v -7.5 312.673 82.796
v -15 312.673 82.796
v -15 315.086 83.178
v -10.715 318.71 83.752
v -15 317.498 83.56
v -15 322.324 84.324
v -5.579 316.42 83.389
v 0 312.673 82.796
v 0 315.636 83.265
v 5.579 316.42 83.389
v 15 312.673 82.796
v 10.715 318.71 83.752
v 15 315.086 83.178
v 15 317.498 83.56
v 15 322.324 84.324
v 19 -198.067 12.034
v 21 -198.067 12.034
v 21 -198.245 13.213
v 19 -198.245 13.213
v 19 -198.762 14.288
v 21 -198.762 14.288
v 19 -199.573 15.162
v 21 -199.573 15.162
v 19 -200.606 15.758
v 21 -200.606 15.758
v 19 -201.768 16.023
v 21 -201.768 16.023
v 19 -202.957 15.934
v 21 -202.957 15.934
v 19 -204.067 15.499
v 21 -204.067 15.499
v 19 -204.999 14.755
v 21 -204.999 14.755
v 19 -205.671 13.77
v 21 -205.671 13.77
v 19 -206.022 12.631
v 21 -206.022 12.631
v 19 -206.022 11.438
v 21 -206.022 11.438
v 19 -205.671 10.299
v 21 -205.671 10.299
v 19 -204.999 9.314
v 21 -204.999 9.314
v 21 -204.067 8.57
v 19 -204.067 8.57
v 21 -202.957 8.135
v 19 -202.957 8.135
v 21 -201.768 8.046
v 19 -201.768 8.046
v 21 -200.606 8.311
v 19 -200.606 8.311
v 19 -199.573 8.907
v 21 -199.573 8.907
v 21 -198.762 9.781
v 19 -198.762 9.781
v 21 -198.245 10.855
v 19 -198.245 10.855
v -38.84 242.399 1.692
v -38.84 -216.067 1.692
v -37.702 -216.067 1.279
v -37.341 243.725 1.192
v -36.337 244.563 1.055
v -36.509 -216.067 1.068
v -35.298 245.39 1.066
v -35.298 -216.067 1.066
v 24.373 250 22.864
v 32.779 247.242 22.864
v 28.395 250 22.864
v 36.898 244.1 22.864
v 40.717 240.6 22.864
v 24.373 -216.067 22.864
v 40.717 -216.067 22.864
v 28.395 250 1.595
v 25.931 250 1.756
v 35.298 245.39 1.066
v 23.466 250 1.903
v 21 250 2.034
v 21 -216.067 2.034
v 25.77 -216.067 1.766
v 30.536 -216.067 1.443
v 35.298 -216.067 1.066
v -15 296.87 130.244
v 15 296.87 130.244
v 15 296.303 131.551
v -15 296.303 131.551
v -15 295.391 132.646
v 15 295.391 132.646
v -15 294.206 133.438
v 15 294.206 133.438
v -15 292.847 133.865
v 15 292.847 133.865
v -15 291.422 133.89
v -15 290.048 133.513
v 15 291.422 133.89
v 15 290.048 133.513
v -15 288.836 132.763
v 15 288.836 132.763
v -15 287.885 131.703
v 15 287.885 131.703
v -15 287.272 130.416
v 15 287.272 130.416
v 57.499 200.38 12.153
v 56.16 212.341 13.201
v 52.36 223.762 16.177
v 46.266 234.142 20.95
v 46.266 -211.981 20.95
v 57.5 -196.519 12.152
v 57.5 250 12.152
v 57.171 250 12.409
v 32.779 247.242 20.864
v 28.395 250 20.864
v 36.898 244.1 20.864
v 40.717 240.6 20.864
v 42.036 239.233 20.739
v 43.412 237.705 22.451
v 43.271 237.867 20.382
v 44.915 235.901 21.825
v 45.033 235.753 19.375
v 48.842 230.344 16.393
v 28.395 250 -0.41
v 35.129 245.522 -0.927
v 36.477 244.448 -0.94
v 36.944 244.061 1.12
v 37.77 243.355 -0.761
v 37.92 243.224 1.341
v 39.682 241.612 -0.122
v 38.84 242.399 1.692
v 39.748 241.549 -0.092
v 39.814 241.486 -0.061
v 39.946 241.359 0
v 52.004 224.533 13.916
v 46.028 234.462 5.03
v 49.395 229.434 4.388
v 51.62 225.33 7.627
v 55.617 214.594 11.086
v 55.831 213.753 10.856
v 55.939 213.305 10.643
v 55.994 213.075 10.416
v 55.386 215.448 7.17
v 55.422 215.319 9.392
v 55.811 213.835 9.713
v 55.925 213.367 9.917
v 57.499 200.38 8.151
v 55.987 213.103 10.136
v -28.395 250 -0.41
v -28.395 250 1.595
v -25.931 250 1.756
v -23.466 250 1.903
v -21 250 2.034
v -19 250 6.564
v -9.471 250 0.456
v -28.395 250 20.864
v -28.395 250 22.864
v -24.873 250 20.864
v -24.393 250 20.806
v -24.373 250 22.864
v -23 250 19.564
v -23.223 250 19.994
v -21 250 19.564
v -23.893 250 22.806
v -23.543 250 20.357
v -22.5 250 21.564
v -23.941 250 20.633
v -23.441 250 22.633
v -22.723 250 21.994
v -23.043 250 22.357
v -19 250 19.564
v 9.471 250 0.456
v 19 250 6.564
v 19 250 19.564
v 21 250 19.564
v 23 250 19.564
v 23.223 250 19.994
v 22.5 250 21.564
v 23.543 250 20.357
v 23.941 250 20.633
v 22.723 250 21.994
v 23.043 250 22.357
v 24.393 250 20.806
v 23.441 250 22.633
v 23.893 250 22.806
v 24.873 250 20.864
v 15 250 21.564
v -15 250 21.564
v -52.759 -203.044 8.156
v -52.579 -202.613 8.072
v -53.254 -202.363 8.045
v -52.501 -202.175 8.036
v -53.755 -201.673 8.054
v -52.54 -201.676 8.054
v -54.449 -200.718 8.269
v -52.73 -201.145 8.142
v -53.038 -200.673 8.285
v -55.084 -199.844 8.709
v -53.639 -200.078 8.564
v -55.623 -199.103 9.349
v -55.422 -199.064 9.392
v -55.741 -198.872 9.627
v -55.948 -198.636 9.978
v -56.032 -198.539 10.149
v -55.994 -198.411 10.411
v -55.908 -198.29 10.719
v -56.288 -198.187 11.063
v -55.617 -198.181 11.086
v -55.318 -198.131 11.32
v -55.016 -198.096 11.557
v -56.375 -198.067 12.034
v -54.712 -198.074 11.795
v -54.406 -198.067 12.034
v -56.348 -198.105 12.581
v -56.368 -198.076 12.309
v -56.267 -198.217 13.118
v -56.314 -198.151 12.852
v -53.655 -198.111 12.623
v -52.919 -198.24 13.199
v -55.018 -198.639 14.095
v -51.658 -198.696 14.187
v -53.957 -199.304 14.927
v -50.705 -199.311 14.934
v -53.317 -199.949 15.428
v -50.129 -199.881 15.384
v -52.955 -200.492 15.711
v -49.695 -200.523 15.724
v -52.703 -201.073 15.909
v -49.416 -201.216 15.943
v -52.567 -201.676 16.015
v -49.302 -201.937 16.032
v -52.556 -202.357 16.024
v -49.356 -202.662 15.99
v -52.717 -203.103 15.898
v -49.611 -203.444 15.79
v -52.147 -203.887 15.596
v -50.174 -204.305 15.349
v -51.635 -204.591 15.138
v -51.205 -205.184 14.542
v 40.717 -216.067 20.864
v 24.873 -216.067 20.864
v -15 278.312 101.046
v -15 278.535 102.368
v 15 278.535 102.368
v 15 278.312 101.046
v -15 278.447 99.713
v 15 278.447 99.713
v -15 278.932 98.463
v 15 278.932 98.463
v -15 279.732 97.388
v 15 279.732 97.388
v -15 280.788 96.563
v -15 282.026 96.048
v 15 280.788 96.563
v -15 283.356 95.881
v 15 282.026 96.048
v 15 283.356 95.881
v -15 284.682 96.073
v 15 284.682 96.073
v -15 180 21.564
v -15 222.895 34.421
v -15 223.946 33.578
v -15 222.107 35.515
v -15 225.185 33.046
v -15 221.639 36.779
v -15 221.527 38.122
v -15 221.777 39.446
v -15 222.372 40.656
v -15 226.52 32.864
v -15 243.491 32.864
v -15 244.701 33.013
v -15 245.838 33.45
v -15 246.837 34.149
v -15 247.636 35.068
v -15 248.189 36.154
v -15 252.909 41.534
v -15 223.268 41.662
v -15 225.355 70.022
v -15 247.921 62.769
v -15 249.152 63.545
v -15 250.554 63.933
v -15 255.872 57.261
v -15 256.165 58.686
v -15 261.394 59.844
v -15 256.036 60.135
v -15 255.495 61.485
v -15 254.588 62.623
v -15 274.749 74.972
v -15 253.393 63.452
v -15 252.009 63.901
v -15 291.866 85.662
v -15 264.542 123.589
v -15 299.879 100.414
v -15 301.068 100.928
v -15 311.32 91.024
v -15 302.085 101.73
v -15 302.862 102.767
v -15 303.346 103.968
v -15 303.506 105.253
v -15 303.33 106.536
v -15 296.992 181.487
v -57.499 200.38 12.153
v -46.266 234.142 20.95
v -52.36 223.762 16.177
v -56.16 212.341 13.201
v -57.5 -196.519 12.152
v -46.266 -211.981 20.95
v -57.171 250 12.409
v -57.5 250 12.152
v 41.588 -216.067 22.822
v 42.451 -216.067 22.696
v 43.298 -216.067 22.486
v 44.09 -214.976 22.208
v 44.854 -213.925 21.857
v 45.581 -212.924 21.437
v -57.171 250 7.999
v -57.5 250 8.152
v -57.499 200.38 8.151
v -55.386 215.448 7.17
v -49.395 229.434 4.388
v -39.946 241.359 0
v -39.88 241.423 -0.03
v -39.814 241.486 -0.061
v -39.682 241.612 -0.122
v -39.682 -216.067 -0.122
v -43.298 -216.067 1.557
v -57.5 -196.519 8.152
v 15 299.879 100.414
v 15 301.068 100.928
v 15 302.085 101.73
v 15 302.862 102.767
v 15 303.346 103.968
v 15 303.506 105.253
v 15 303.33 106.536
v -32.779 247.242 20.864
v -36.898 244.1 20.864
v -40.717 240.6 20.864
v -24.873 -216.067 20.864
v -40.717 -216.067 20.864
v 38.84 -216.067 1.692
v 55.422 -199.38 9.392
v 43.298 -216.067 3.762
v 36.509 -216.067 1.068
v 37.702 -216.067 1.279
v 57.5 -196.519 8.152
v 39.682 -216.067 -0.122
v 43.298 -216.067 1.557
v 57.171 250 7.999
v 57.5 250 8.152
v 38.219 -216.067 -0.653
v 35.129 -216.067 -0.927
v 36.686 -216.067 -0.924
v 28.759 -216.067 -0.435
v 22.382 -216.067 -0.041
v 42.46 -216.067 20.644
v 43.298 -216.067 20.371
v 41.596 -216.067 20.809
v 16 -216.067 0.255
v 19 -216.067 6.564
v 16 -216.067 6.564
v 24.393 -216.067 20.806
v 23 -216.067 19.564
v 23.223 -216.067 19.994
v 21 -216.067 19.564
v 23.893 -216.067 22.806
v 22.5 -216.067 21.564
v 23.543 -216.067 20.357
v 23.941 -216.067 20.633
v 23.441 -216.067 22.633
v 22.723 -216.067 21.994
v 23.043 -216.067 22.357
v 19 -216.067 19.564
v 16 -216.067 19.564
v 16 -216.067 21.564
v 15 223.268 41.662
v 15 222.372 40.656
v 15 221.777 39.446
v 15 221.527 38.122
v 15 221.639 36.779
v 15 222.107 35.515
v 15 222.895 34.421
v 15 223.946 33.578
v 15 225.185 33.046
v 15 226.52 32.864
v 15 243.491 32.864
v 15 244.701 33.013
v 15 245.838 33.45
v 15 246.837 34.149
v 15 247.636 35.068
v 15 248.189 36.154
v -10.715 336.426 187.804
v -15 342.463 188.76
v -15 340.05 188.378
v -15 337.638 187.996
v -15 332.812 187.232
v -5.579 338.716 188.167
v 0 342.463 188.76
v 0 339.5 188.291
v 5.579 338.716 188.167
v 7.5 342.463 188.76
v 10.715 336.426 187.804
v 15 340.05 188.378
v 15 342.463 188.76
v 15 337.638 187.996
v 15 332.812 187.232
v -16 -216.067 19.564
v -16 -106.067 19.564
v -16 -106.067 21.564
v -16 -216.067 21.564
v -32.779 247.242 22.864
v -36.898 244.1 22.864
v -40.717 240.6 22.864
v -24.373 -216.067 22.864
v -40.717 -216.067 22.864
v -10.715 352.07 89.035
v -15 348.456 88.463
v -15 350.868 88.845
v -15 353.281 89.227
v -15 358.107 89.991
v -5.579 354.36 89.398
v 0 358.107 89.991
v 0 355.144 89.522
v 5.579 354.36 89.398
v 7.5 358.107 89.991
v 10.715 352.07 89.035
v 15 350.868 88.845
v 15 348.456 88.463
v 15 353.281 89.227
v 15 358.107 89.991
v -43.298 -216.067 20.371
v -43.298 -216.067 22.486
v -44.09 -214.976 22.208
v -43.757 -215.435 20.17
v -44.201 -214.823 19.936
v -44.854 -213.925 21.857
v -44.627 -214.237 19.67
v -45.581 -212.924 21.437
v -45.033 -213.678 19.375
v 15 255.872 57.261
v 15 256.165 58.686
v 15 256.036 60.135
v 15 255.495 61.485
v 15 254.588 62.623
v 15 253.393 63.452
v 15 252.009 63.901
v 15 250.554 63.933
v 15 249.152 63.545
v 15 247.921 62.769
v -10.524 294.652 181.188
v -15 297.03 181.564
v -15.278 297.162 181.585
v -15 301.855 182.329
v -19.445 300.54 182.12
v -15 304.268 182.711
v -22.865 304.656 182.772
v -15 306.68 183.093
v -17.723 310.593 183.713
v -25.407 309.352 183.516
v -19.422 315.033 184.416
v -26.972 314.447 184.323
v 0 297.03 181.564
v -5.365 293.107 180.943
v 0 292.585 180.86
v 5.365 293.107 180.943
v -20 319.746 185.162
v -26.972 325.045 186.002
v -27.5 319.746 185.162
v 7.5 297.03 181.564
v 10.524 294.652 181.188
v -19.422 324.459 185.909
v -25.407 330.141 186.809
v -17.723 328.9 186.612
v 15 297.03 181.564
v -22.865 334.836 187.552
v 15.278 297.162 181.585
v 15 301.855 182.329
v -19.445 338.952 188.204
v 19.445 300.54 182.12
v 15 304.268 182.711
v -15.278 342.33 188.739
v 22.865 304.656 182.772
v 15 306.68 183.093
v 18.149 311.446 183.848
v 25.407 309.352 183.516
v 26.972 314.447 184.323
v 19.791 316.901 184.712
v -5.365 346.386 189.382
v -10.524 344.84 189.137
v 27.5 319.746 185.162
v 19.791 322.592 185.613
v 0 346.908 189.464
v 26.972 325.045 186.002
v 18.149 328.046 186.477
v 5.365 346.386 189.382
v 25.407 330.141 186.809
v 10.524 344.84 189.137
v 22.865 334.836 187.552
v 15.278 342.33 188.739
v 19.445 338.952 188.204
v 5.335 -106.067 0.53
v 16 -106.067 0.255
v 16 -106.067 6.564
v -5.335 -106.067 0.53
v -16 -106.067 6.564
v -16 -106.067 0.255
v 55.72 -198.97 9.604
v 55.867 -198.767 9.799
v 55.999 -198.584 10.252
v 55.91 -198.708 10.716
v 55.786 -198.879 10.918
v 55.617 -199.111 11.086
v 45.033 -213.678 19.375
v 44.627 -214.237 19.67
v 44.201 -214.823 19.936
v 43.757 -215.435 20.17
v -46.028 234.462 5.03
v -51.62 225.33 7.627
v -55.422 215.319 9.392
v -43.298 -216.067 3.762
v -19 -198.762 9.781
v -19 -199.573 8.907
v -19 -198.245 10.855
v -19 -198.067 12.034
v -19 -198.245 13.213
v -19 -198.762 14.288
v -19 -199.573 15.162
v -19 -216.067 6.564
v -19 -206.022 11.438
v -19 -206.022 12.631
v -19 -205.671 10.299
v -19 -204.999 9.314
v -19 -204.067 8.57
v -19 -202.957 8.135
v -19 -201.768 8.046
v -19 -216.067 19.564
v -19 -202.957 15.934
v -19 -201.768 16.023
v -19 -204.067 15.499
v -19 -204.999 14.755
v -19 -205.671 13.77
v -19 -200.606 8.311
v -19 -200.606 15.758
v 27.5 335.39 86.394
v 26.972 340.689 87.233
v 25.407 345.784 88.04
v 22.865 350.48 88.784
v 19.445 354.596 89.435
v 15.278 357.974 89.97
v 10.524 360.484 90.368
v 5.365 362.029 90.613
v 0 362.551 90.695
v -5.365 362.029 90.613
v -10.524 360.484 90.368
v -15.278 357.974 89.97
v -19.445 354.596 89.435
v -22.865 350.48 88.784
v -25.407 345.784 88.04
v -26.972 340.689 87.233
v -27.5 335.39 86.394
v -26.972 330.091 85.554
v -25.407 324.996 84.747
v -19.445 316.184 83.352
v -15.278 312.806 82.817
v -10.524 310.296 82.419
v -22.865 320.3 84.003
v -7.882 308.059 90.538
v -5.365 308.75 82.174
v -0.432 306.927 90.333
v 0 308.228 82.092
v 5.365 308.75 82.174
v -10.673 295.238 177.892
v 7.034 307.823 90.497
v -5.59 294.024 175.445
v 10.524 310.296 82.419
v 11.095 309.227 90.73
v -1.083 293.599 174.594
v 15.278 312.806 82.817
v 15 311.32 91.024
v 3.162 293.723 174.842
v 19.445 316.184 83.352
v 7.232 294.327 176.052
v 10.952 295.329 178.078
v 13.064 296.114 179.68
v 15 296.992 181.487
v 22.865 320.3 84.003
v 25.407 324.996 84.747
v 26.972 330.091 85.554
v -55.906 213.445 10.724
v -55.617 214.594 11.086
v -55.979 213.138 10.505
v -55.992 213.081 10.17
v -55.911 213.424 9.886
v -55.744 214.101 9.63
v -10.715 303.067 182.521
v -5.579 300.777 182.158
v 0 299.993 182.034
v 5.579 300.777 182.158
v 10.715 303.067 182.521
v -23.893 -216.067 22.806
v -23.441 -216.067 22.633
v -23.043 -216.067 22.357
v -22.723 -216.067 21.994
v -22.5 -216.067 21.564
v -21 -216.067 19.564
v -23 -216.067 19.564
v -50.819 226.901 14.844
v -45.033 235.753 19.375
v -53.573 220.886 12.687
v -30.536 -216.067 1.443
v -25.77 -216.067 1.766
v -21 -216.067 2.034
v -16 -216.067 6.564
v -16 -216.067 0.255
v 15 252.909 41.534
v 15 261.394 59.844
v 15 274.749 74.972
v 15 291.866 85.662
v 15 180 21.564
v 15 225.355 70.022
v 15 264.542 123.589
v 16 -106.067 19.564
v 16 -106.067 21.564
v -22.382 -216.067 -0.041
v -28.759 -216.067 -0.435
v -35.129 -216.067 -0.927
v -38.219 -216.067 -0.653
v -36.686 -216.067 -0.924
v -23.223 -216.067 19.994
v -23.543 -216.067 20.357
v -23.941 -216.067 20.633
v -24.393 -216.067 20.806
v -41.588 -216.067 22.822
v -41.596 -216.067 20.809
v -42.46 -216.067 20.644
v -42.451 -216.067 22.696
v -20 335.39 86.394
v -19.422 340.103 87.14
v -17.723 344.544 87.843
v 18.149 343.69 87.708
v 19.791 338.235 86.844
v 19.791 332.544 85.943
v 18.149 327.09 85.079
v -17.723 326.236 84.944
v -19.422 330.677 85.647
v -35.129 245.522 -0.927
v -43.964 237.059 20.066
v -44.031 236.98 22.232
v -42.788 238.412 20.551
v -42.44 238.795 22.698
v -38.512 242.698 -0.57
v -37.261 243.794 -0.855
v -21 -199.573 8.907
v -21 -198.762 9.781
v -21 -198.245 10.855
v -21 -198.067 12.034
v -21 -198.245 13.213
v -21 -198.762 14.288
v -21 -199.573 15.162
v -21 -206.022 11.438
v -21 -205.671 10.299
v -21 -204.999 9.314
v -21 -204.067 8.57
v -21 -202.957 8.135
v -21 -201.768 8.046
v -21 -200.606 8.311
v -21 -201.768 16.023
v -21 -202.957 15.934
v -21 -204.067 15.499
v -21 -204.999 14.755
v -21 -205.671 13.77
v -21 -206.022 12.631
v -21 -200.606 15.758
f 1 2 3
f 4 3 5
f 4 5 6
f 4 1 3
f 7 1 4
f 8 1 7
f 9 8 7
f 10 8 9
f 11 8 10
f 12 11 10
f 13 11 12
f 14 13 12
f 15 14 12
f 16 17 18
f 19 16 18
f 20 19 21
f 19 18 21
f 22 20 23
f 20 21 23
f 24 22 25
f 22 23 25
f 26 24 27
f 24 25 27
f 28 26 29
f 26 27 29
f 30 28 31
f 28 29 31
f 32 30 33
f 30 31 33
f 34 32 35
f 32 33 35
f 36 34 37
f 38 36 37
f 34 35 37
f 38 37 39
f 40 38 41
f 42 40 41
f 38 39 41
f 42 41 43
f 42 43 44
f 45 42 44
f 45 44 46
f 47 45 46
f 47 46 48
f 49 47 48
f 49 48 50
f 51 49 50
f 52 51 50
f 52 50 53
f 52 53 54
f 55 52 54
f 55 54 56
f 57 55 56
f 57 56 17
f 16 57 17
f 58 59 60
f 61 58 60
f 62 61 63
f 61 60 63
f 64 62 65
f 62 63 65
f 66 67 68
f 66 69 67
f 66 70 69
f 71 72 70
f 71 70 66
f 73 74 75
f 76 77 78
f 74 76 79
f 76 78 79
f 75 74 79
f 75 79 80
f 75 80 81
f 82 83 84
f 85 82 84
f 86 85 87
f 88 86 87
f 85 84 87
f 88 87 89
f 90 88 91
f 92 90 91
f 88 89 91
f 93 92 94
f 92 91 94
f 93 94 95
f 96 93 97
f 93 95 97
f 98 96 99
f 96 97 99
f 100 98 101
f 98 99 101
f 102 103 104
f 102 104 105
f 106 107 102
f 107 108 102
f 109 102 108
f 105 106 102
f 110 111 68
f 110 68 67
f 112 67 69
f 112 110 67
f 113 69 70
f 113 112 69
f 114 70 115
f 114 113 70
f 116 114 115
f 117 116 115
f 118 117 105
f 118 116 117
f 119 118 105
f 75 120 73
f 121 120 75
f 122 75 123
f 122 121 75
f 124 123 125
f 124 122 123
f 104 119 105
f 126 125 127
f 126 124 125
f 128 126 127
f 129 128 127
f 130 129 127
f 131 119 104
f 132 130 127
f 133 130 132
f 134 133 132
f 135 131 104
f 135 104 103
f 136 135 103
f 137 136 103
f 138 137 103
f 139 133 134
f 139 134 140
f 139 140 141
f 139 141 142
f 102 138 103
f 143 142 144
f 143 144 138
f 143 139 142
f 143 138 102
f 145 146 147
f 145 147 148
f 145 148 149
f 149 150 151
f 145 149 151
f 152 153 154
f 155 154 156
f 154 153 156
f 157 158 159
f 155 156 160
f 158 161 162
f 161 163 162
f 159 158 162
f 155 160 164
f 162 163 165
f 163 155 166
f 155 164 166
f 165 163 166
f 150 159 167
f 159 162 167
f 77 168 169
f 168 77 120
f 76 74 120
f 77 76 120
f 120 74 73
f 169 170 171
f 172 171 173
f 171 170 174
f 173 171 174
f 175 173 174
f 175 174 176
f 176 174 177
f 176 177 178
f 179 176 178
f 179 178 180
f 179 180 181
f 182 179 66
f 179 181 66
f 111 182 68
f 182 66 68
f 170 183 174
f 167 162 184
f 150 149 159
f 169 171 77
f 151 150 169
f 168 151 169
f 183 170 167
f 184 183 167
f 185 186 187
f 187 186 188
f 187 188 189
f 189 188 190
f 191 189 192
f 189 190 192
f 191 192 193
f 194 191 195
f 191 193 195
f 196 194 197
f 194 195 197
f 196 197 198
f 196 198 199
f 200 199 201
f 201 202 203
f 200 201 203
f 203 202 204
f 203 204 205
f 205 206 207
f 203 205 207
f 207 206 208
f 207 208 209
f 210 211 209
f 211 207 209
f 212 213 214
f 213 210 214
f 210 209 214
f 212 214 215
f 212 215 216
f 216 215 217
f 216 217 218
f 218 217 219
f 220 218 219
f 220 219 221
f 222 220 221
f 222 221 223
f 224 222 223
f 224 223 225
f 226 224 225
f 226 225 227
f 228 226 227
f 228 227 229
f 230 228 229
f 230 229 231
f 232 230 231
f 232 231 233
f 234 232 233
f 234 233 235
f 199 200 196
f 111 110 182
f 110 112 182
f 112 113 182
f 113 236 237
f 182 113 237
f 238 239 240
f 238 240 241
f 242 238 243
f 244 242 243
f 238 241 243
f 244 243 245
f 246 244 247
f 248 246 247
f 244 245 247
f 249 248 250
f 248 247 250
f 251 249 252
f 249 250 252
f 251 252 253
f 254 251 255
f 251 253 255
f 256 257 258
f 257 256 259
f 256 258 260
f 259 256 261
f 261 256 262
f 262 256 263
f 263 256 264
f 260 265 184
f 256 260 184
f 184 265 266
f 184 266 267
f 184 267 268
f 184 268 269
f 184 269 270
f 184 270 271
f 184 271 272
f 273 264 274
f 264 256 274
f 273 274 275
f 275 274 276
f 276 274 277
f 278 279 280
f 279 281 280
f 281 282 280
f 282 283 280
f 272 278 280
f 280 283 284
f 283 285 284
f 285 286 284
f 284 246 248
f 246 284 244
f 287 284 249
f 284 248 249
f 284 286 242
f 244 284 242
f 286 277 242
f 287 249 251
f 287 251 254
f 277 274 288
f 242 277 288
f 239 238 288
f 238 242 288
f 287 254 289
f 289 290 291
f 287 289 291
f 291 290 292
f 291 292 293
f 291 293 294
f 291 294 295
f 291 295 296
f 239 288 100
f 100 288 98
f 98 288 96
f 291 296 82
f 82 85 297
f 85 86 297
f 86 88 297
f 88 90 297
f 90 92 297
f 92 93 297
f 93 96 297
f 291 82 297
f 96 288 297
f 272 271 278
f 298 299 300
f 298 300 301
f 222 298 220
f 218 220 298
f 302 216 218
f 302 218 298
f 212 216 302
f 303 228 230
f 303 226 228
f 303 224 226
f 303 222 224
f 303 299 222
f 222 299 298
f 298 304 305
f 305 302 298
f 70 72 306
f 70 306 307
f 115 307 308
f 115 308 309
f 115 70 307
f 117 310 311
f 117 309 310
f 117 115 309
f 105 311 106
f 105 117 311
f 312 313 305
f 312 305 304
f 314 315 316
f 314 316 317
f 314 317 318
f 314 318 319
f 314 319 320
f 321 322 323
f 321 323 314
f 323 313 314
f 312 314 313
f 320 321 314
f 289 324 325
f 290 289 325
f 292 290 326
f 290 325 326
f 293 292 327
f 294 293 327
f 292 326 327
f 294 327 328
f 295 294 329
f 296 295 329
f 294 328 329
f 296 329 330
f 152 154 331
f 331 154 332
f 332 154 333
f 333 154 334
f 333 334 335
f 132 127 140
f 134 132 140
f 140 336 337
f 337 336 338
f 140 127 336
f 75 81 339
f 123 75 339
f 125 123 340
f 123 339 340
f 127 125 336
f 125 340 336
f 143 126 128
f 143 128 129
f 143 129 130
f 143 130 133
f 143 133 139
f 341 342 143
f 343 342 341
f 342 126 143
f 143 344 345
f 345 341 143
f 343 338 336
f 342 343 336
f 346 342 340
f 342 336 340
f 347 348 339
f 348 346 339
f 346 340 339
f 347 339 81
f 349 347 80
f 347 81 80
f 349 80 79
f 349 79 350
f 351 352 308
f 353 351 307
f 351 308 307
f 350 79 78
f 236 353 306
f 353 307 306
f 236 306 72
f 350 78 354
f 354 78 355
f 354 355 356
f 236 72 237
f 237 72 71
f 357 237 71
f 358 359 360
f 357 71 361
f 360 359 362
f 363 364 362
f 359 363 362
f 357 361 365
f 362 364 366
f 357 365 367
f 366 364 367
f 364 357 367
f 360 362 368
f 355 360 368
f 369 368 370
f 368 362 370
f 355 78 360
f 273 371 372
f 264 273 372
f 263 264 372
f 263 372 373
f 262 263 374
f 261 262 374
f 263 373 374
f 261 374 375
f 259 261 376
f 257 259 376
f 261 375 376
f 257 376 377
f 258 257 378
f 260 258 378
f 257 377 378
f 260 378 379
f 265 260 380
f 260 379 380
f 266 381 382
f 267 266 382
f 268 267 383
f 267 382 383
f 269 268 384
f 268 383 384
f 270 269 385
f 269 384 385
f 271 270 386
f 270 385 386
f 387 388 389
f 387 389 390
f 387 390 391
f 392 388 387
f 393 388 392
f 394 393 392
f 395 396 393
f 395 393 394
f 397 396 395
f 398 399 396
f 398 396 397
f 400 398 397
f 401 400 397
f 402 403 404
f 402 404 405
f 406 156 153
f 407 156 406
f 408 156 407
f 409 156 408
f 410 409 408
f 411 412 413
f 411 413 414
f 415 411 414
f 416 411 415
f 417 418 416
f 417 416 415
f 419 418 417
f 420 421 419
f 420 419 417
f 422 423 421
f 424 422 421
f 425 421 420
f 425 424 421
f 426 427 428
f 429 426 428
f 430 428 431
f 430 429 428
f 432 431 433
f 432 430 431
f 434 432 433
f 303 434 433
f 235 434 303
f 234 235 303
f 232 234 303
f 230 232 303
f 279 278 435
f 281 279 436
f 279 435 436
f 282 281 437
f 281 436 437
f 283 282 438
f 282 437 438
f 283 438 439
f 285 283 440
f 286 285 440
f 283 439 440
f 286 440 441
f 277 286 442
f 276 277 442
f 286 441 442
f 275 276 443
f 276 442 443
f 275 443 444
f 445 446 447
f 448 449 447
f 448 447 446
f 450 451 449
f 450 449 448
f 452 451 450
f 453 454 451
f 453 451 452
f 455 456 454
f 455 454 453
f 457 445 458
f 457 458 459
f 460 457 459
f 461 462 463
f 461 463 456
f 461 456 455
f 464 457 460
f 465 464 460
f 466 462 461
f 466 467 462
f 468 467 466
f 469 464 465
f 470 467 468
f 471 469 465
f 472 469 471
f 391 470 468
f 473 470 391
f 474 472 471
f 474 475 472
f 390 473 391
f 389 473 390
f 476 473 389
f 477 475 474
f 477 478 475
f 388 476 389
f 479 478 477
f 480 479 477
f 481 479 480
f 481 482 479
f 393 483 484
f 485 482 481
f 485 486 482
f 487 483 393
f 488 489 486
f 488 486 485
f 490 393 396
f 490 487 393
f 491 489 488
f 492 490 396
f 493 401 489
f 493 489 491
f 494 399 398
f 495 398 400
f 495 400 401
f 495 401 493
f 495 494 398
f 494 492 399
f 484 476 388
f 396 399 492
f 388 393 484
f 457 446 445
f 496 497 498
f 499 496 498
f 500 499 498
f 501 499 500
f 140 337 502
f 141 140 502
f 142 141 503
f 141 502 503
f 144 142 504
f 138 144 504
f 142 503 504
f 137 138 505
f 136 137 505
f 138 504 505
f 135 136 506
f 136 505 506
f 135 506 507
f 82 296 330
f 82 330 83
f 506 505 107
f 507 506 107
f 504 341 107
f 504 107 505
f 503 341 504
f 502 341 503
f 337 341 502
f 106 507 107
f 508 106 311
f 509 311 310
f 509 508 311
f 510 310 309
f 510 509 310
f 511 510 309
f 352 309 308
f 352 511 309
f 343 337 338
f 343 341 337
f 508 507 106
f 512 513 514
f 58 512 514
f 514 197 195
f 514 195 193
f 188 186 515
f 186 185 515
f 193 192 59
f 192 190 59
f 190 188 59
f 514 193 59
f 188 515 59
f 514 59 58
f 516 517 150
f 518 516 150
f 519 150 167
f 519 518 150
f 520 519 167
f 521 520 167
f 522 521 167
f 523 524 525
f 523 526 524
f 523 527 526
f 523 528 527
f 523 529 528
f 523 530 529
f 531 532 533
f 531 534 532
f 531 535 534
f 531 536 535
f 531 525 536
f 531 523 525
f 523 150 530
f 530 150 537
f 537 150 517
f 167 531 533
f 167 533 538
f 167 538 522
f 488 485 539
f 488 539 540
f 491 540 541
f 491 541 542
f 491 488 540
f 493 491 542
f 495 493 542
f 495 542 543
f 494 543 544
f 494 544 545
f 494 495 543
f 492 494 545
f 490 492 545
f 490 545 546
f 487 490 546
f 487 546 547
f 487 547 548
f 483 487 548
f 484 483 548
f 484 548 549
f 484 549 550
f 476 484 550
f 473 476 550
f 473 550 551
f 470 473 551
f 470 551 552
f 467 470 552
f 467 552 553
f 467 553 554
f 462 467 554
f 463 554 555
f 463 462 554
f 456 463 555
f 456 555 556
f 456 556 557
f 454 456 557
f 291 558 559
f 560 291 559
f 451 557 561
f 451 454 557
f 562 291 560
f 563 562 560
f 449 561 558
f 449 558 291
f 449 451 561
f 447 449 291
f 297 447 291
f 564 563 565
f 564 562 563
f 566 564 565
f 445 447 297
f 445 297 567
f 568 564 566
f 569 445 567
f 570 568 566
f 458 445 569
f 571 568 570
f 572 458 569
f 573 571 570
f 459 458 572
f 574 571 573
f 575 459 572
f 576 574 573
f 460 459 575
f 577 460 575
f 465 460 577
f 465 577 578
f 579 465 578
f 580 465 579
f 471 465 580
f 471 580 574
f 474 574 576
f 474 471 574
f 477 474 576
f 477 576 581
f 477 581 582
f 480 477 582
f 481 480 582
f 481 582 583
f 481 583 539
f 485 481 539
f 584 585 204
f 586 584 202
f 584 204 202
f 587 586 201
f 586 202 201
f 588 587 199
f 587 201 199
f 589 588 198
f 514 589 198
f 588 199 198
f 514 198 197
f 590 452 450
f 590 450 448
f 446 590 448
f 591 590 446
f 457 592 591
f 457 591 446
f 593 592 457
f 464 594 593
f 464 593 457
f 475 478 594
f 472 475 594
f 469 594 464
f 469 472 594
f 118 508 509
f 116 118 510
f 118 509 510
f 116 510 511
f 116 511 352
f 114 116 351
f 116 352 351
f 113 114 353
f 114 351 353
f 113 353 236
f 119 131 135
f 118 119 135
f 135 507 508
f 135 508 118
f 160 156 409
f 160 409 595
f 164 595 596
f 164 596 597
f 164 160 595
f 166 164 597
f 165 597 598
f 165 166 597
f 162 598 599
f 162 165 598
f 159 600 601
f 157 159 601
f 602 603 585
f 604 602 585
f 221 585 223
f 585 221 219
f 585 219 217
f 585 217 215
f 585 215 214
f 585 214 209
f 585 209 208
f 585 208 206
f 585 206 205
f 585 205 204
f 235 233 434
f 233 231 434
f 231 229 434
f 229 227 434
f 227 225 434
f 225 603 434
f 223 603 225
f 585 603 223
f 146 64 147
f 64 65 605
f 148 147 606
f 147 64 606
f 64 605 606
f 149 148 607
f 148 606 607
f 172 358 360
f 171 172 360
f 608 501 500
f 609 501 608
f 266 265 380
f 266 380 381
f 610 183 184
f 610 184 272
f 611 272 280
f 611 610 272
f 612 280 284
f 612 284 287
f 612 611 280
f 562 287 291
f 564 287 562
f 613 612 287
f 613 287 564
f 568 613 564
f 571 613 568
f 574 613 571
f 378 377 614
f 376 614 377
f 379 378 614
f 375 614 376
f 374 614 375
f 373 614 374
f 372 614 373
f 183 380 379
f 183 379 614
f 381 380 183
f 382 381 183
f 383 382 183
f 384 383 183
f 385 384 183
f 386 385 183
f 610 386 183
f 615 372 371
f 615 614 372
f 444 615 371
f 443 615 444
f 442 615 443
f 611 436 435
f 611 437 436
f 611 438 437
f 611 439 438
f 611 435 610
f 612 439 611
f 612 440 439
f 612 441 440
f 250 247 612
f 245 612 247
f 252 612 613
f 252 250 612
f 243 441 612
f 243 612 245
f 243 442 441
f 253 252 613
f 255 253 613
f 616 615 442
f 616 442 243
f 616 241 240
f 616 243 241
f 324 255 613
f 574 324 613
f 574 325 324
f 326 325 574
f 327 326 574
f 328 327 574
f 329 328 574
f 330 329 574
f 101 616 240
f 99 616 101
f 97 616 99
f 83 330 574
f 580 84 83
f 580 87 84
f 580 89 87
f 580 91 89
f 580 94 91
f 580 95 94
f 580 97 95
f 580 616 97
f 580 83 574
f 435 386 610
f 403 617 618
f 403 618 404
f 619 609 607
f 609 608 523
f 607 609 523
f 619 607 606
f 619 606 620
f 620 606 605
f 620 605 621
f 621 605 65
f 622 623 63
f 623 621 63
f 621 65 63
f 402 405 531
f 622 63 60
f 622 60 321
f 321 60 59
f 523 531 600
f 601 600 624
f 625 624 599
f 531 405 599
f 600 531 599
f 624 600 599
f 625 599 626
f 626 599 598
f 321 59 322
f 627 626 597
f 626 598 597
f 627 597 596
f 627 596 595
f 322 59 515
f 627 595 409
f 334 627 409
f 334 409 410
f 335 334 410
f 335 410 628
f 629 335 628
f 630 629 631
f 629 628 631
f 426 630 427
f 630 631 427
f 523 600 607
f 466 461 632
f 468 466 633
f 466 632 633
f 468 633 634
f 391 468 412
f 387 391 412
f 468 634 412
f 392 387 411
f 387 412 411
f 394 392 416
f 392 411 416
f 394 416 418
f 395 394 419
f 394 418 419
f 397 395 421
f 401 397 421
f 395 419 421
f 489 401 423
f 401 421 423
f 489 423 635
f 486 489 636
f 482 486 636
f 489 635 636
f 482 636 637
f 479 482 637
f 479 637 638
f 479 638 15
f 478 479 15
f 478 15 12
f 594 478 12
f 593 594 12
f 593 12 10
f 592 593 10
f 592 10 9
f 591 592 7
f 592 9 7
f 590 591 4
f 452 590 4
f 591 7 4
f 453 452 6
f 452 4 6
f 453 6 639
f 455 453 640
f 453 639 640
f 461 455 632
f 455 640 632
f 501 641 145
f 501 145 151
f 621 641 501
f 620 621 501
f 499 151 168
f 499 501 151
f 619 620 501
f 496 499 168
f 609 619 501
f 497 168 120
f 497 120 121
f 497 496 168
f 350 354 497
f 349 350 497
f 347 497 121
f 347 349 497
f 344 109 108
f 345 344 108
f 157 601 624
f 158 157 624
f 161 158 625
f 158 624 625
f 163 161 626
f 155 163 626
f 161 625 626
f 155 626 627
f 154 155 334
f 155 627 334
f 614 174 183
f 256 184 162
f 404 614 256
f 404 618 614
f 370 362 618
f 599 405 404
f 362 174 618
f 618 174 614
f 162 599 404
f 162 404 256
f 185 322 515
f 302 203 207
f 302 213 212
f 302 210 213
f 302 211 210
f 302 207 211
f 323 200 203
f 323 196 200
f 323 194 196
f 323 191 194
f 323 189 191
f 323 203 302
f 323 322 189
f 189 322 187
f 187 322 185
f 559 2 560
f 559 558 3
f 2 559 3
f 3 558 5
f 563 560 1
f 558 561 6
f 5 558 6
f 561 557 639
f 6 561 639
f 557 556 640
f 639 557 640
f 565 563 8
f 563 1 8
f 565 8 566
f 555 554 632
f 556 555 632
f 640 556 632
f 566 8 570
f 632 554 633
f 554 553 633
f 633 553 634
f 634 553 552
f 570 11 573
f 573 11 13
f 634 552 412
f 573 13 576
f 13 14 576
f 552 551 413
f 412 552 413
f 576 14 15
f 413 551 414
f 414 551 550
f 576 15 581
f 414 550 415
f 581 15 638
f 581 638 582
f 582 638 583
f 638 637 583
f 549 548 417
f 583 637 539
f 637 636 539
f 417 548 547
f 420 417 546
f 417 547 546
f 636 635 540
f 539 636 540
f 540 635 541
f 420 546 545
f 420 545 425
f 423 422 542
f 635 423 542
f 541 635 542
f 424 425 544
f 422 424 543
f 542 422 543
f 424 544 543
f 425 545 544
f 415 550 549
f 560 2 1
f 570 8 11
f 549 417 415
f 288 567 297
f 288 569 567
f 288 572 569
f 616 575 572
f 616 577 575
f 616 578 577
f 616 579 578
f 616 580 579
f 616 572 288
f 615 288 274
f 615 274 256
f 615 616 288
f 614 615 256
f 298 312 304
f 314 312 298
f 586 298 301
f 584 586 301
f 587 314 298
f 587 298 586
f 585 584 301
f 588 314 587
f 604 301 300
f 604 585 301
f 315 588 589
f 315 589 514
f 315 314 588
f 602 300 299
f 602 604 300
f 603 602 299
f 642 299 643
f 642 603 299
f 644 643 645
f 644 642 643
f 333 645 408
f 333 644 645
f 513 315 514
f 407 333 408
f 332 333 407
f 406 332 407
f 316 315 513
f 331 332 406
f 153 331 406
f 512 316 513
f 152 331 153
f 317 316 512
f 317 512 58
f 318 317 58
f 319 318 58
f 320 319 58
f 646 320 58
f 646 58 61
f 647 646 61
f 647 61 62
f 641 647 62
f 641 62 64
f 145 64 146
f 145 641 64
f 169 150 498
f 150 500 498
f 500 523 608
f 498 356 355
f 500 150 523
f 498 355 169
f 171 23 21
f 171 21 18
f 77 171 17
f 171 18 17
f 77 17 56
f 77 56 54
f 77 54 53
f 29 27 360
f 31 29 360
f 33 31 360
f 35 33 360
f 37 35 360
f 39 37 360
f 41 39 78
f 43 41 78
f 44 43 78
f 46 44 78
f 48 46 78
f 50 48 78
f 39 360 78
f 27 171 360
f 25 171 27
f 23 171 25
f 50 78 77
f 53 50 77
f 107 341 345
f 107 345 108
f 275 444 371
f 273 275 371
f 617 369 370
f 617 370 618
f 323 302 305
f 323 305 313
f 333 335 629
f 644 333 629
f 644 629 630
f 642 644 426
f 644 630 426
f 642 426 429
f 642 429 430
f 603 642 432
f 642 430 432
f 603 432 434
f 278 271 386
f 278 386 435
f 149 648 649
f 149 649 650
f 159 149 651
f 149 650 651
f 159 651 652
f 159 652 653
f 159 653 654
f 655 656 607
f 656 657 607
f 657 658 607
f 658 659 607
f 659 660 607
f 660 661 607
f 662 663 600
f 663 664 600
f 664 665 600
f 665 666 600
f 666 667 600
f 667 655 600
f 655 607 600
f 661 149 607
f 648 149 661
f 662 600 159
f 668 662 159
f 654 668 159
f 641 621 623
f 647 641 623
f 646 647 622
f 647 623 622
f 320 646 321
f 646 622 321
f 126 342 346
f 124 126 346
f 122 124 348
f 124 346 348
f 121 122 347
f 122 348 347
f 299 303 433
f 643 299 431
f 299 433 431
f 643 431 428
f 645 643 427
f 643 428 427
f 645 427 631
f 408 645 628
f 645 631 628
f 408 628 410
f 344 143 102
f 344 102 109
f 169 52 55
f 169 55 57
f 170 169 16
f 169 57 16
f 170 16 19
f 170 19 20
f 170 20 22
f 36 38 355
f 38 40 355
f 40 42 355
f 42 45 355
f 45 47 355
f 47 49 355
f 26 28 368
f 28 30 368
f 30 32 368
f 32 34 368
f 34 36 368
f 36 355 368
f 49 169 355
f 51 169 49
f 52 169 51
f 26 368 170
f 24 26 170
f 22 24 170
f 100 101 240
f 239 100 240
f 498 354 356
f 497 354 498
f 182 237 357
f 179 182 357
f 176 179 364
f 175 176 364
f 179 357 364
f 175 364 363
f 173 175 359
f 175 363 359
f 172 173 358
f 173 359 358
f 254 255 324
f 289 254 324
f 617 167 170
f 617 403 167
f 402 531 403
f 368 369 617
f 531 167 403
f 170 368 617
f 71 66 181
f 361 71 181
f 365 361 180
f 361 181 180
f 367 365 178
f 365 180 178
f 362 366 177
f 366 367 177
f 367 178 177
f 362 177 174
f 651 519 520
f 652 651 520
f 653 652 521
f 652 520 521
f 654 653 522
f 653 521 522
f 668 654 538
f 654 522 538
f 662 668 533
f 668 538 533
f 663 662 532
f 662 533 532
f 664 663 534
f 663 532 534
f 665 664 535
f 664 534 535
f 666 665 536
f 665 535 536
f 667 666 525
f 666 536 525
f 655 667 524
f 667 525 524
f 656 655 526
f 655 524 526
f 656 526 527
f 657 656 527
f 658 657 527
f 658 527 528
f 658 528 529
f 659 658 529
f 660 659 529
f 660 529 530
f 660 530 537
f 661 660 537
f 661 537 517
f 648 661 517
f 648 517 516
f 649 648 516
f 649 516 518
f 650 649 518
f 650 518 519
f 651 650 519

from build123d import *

# Parameters (mm, degrees)
F1_DEPTH       = 250
F2_W           = 38
F2_H           = 13
F3_DEPTH       = 250
F4_T1_DEPTH    = 509.3674969976
F5_R           = 9
F7_DEPTH       = 500.001
F9_DEPTH       = 0.9604886552
F9_DEPTH_BACK  = 22.8653446865
F11_DEPTH      = 0.9604887634
F11_DEPTH_BACK = 22.8653447865
F13_DEPTH      = 15
F14_R          = 27.5
F15_DEPTH      = 100
F17_D          = 40
F19_D          = 8
F19_DEPTH      = 78.501
F21_DEPTH      = 72.501


# Not quite as in the source:
# - a fillet or chamfer that OpenCascade refuses, or shapes differently, is made with other operations: its cross-section is extruded or revolved along the edge and cut away or added


with BuildPart() as f1:
    # F0 (on Front) → F1 (new body, symmetric)
    with BuildSketch(Plane.XZ):
        with BuildLine():
            Line((22.5, 21.5643446865), (0, 21.5643446865))
            Line((0, 21.5643446865), (-22.5, 21.5643446865))
            Line((-22.5, 21.5643446865), (-22.5, 22.8643446865))
            Line((-22.5, 22.8643446865), (-43.8217498065, 22.8643446865))
            Line((-43.8217498065, 22.8643446865), (-57.5, 12.151993139))
            Line((-57.5, 12.151993139), (-57.5, 8.151993139))
            Line((-57.5, 8.151993139), (-37.5, -1.1356553135))
            ThreePointArc((-37.5, -1.1356553135), (0, 0.564188832), (37.5, -1.1356553135))
            Line((37.5, -1.1356553135), (57.5, 8.151993139))
            Line((57.5, 8.151993139), (57.5, 12.151993139))
            Line((57.5, 12.151993139), (43.8217498065, 22.8643446865))
            Line((43.8217498065, 22.8643446865), (22.5, 22.8643446865))
            Line((22.5, 22.8643446865), (22.5, 21.5643446865))
        make_face()
    extrude(amount=F1_DEPTH, both=True)

    # F2 (on Front) → F3 (cut, symmetric)
    with BuildSketch(Plane.XZ):
        with Locations((0, 13.0643446865)):
            Rectangle(F2_W, F2_H)
    extrude(amount=F3_DEPTH, both=True, mode=Mode.SUBTRACT)

    # F4: fillet of radius 2 on 2 edges, made by hand

    # F4_s2 → F4_t1 (cut)
    with BuildSketch(Plane.XZ.offset(-254.6837484988)):
        with BuildLine():
            ThreePointArc((-24.3734993995, 22.8643446865), (-23.2333239744, 22.507512359), (-22.5, 21.5643446865))
            Line((-22.5, 21.5643446865), (-22.5, 22.8643446865))
            Line((-22.5, 22.8643446865), (-24.3734993995, 22.8643446865))
        make_face()
        with BuildLine():
            ThreePointArc((24.3734993995, 22.8643446865), (23.2333239744, 22.507512359), (22.5, 21.5643446865))
            Line((22.5, 21.5643446865), (22.5, 22.8643446865))
            Line((22.5, 22.8643446865), (24.3734993995, 22.8643446865))
        make_face()
    extrude(amount=F4_T1_DEPTH, mode=Mode.SUBTRACT)

    # F5
    f5_edges = [f1.edges().sort_by_distance(p)[0] for p in [
        (43.82175, 0, 22.864345),
        (-43.82175, 0, 22.864345),
        (-37.5, 0, -1.135655),
        (37.5, 0, -1.135655),
    ]]
    fillet(f5_edges, radius=F5_R)

    # F6 (on face) → F7 (cut, through all)
    with BuildSketch(Plane.XZ.offset(250)):
        with BuildLine():
            ThreePointArc((-38.8398592766, 1.6916831032), (-37.1099744385, 1.1473623621), (-35.2983129545, 1.0656966447))
            ThreePointArc((-35.2983129545, 1.0656966447), (-28.1533234397, 1.6115661831), (-21, 2.034428437))
            Line((-21, 2.034428437), (-21, 19.5643446865))
            Line((-21, 19.5643446865), (-23, 19.5643446865))
            ThreePointArc((-23, 19.5643446865), (-23.7333239744, 20.507512359), (-24.8734993995, 20.8643446865))
            Line((-24.8734993995, 20.8643446865), (-40.7169256034, 20.8643446865))
            ThreePointArc((-40.7169256034, 20.8643446865), (-42.9997645145, 20.4816437205), (-45.0329906666, 19.3753865454))
            Line((-45.0329906666, 19.3753865454), (-55.617097211, 11.0862656041))
            ThreePointArc((-55.617097211, 11.0862656041), (-55.9939317717, 10.1844048326), (-55.4216999505, 9.3919984469))
            Line((-55.4216999505, 9.3919984469), (-38.8398592766, 1.6916831032))
        make_face()
        with BuildLine():
            Line((21, 19.5643446865), (21, 2.034428437))
            ThreePointArc((21, 2.034428437), (28.1533234397, 1.6115661831), (35.2983129545, 1.0656966447))
            ThreePointArc((35.2983129545, 1.0656966447), (37.1099744385, 1.1473623621), (38.8398592766, 1.6916831032))
            Line((38.8398592766, 1.6916831032), (55.4216999505, 9.3919984469))
            ThreePointArc((55.4216999505, 9.3919984469), (55.9939317717, 10.1844048326), (55.617097211, 11.0862656041))
            Line((55.617097211, 11.0862656041), (45.0329906666, 19.3753865454))
            ThreePointArc((45.0329906666, 19.3753865454), (42.9997645145, 20.4816437205), (40.7169256034, 20.8643446865))
            Line((40.7169256034, 20.8643446865), (24.8734993995, 20.8643446865))
            ThreePointArc((24.8734993995, 20.8643446865), (23.7333239744, 20.507512359), (23, 19.5643446865))
            Line((23, 19.5643446865), (21, 19.5643446865))
        make_face()
    extrude(amount=-F7_DEPTH, mode=Mode.SUBTRACT)

    # F8 (on Top) → F9 (cut, two sides)
    with BuildSketch(Plane.XY) as f9_sk:
        with BuildLine():
            ThreePointArc((-57.4987473195, 200.3795480055), (0, 257.5), (57.4987473195, 200.3795480055))
            Line((57.4987473195, 200.3795480055), (56.9706690247, 280.3795480055))
            Line((56.9706690247, 280.3795480055), (-56.9706690247, 280.3795480055))
            Line((-56.9706690247, 280.3795480055), (-57.4987473195, 200.3795480055))
        make_face()
    extrude(amount=-F9_DEPTH, mode=Mode.SUBTRACT)
    extrude(f9_sk.sketch, amount=F9_DEPTH_BACK, mode=Mode.SUBTRACT)

    # F10 (on Top) → F11 (cut, two sides)
    with BuildSketch(Plane.XY) as f11_sk:
        Polygon((-16, -216.0670316956), (-43.2975540478, -216.0670316956), (-68, -182.0670316956), (-68, -312.0670316956), (0, -312.0670316956), (0, -106.0670316956), (-16, -106.0670316956), align=None)
        Polygon((16, -106.0670316956), (0, -106.0670316956), (0, -312.0670316956), (68, -312.0670316956), (68, -182.0670316956), (43.2975540478, -216.0670316956), (16, -216.0670316956), align=None)
    extrude(amount=-F11_DEPTH, mode=Mode.SUBTRACT)
    extrude(f11_sk.sketch, amount=F11_DEPTH_BACK, mode=Mode.SUBTRACT)

    # F12 (on Right) → F13 (join, symmetric)
    with BuildSketch(Plane.YZ):
        with BuildLine():
            ThreePointArc((297.0295354887, 181.5643446865), (245.7826981398, 96.2483289481), (180, 21.5643446865))
            Line((180, 21.5643446865), (250, 21.5643446865))
            ThreePointArc((250, 21.5643446865), (267.5395947829, 67.9098502341), (311.3687395561, 91.0301732869))
            Line((311.3687395561, 91.0301732869), (312.6729819927, 82.795510627))
            Line((312.6729819927, 82.795510627), (358.1066456601, 89.9914960188))
            Line((358.1066456601, 89.9914960188), (342.4631991561, 188.7603300783))
            Line((342.4631991561, 188.7603300783), (297.0295354887, 181.5643446865))
        make_face()
    extrude(amount=F13_DEPTH, both=True)

    # F14 (on face) → F15 (join, through all)
    with BuildSketch(Plane(origin=(0, -20.7844039253, 131.2275617651), x_dir=(1, 0, 0), z_dir=(0, -0.156434465, 0.9876883406))):
        with Locations((0, 344.775530146)):
            Circle(F14_R)
    extrude(amount=-F15_DEPTH)

    # F17 (through all)
    with Locations(Plane(origin=(0, -20.7844039253, 131.2275617651), x_dir=(1, 0, 0), z_dir=(0, -0.156434465, 0.9876883406))):
        with Locations((0, 344.775530146)):
            Hole(F17_D / 2)

    # F19 (through all, one way)
    with BuildSketch(Plane.YZ.offset(21)):
        with Locations((-202.0670316956, 12.034428437)):
            Circle(F19_D / 2)
    extrude(amount=-F19_DEPTH, mode=Mode.SUBTRACT)

    # F20 (on face) → F21 (cut, through all)
    with BuildSketch(Plane.YZ.offset(15)):
        with BuildLine():
            Line((303.3300998051, 106.5364009657), (296.8697635571, 130.2439192545))
            ThreePointArc((296.8697635571, 130.2439192545), (292.1354764945, 133.9285390129), (287.271901756, 130.4163406247))
            Line((287.271901756, 130.4163406247), (278.5350250255, 102.3679551307))
            ThreePointArc((278.5350250255, 102.3679551307), (279.7315404872, 97.3876414374), (284.6820479704, 96.0732406641))
            Line((284.6820479704, 96.0732406641), (299.8792609489, 100.4141078692))
            ThreePointArc((299.8792609489, 100.4141078692), (302.8617375272, 102.7667124398), (303.3300998051, 106.5364009657))
        make_face()
        with BuildLine():
            ThreePointArc((243.4909897109, 32.8643446865), (246.3588718926, 33.768584465), (248.1894528148, 36.1542439699))
            Line((248.1894528148, 36.1542439699), (255.8716915251, 57.2610213573))
            ThreePointArc((255.8716915251, 57.2610213573), (254.0207530146, 63.0810616952), (247.921439605, 62.7692623419))
            Line((247.921439605, 62.7692623419), (223.2683930345, 41.6624849544))
            ThreePointArc((223.2683930345, 41.6624849544), (221.8302617373, 36.1309522525), (226.5201818507, 32.8643446865))
            Line((226.5201818507, 32.8643446865), (243.4909897109, 32.8643446865))
        make_face()
    extrude(amount=-F21_DEPTH, mode=Mode.SUBTRACT)


solid = f1.part
